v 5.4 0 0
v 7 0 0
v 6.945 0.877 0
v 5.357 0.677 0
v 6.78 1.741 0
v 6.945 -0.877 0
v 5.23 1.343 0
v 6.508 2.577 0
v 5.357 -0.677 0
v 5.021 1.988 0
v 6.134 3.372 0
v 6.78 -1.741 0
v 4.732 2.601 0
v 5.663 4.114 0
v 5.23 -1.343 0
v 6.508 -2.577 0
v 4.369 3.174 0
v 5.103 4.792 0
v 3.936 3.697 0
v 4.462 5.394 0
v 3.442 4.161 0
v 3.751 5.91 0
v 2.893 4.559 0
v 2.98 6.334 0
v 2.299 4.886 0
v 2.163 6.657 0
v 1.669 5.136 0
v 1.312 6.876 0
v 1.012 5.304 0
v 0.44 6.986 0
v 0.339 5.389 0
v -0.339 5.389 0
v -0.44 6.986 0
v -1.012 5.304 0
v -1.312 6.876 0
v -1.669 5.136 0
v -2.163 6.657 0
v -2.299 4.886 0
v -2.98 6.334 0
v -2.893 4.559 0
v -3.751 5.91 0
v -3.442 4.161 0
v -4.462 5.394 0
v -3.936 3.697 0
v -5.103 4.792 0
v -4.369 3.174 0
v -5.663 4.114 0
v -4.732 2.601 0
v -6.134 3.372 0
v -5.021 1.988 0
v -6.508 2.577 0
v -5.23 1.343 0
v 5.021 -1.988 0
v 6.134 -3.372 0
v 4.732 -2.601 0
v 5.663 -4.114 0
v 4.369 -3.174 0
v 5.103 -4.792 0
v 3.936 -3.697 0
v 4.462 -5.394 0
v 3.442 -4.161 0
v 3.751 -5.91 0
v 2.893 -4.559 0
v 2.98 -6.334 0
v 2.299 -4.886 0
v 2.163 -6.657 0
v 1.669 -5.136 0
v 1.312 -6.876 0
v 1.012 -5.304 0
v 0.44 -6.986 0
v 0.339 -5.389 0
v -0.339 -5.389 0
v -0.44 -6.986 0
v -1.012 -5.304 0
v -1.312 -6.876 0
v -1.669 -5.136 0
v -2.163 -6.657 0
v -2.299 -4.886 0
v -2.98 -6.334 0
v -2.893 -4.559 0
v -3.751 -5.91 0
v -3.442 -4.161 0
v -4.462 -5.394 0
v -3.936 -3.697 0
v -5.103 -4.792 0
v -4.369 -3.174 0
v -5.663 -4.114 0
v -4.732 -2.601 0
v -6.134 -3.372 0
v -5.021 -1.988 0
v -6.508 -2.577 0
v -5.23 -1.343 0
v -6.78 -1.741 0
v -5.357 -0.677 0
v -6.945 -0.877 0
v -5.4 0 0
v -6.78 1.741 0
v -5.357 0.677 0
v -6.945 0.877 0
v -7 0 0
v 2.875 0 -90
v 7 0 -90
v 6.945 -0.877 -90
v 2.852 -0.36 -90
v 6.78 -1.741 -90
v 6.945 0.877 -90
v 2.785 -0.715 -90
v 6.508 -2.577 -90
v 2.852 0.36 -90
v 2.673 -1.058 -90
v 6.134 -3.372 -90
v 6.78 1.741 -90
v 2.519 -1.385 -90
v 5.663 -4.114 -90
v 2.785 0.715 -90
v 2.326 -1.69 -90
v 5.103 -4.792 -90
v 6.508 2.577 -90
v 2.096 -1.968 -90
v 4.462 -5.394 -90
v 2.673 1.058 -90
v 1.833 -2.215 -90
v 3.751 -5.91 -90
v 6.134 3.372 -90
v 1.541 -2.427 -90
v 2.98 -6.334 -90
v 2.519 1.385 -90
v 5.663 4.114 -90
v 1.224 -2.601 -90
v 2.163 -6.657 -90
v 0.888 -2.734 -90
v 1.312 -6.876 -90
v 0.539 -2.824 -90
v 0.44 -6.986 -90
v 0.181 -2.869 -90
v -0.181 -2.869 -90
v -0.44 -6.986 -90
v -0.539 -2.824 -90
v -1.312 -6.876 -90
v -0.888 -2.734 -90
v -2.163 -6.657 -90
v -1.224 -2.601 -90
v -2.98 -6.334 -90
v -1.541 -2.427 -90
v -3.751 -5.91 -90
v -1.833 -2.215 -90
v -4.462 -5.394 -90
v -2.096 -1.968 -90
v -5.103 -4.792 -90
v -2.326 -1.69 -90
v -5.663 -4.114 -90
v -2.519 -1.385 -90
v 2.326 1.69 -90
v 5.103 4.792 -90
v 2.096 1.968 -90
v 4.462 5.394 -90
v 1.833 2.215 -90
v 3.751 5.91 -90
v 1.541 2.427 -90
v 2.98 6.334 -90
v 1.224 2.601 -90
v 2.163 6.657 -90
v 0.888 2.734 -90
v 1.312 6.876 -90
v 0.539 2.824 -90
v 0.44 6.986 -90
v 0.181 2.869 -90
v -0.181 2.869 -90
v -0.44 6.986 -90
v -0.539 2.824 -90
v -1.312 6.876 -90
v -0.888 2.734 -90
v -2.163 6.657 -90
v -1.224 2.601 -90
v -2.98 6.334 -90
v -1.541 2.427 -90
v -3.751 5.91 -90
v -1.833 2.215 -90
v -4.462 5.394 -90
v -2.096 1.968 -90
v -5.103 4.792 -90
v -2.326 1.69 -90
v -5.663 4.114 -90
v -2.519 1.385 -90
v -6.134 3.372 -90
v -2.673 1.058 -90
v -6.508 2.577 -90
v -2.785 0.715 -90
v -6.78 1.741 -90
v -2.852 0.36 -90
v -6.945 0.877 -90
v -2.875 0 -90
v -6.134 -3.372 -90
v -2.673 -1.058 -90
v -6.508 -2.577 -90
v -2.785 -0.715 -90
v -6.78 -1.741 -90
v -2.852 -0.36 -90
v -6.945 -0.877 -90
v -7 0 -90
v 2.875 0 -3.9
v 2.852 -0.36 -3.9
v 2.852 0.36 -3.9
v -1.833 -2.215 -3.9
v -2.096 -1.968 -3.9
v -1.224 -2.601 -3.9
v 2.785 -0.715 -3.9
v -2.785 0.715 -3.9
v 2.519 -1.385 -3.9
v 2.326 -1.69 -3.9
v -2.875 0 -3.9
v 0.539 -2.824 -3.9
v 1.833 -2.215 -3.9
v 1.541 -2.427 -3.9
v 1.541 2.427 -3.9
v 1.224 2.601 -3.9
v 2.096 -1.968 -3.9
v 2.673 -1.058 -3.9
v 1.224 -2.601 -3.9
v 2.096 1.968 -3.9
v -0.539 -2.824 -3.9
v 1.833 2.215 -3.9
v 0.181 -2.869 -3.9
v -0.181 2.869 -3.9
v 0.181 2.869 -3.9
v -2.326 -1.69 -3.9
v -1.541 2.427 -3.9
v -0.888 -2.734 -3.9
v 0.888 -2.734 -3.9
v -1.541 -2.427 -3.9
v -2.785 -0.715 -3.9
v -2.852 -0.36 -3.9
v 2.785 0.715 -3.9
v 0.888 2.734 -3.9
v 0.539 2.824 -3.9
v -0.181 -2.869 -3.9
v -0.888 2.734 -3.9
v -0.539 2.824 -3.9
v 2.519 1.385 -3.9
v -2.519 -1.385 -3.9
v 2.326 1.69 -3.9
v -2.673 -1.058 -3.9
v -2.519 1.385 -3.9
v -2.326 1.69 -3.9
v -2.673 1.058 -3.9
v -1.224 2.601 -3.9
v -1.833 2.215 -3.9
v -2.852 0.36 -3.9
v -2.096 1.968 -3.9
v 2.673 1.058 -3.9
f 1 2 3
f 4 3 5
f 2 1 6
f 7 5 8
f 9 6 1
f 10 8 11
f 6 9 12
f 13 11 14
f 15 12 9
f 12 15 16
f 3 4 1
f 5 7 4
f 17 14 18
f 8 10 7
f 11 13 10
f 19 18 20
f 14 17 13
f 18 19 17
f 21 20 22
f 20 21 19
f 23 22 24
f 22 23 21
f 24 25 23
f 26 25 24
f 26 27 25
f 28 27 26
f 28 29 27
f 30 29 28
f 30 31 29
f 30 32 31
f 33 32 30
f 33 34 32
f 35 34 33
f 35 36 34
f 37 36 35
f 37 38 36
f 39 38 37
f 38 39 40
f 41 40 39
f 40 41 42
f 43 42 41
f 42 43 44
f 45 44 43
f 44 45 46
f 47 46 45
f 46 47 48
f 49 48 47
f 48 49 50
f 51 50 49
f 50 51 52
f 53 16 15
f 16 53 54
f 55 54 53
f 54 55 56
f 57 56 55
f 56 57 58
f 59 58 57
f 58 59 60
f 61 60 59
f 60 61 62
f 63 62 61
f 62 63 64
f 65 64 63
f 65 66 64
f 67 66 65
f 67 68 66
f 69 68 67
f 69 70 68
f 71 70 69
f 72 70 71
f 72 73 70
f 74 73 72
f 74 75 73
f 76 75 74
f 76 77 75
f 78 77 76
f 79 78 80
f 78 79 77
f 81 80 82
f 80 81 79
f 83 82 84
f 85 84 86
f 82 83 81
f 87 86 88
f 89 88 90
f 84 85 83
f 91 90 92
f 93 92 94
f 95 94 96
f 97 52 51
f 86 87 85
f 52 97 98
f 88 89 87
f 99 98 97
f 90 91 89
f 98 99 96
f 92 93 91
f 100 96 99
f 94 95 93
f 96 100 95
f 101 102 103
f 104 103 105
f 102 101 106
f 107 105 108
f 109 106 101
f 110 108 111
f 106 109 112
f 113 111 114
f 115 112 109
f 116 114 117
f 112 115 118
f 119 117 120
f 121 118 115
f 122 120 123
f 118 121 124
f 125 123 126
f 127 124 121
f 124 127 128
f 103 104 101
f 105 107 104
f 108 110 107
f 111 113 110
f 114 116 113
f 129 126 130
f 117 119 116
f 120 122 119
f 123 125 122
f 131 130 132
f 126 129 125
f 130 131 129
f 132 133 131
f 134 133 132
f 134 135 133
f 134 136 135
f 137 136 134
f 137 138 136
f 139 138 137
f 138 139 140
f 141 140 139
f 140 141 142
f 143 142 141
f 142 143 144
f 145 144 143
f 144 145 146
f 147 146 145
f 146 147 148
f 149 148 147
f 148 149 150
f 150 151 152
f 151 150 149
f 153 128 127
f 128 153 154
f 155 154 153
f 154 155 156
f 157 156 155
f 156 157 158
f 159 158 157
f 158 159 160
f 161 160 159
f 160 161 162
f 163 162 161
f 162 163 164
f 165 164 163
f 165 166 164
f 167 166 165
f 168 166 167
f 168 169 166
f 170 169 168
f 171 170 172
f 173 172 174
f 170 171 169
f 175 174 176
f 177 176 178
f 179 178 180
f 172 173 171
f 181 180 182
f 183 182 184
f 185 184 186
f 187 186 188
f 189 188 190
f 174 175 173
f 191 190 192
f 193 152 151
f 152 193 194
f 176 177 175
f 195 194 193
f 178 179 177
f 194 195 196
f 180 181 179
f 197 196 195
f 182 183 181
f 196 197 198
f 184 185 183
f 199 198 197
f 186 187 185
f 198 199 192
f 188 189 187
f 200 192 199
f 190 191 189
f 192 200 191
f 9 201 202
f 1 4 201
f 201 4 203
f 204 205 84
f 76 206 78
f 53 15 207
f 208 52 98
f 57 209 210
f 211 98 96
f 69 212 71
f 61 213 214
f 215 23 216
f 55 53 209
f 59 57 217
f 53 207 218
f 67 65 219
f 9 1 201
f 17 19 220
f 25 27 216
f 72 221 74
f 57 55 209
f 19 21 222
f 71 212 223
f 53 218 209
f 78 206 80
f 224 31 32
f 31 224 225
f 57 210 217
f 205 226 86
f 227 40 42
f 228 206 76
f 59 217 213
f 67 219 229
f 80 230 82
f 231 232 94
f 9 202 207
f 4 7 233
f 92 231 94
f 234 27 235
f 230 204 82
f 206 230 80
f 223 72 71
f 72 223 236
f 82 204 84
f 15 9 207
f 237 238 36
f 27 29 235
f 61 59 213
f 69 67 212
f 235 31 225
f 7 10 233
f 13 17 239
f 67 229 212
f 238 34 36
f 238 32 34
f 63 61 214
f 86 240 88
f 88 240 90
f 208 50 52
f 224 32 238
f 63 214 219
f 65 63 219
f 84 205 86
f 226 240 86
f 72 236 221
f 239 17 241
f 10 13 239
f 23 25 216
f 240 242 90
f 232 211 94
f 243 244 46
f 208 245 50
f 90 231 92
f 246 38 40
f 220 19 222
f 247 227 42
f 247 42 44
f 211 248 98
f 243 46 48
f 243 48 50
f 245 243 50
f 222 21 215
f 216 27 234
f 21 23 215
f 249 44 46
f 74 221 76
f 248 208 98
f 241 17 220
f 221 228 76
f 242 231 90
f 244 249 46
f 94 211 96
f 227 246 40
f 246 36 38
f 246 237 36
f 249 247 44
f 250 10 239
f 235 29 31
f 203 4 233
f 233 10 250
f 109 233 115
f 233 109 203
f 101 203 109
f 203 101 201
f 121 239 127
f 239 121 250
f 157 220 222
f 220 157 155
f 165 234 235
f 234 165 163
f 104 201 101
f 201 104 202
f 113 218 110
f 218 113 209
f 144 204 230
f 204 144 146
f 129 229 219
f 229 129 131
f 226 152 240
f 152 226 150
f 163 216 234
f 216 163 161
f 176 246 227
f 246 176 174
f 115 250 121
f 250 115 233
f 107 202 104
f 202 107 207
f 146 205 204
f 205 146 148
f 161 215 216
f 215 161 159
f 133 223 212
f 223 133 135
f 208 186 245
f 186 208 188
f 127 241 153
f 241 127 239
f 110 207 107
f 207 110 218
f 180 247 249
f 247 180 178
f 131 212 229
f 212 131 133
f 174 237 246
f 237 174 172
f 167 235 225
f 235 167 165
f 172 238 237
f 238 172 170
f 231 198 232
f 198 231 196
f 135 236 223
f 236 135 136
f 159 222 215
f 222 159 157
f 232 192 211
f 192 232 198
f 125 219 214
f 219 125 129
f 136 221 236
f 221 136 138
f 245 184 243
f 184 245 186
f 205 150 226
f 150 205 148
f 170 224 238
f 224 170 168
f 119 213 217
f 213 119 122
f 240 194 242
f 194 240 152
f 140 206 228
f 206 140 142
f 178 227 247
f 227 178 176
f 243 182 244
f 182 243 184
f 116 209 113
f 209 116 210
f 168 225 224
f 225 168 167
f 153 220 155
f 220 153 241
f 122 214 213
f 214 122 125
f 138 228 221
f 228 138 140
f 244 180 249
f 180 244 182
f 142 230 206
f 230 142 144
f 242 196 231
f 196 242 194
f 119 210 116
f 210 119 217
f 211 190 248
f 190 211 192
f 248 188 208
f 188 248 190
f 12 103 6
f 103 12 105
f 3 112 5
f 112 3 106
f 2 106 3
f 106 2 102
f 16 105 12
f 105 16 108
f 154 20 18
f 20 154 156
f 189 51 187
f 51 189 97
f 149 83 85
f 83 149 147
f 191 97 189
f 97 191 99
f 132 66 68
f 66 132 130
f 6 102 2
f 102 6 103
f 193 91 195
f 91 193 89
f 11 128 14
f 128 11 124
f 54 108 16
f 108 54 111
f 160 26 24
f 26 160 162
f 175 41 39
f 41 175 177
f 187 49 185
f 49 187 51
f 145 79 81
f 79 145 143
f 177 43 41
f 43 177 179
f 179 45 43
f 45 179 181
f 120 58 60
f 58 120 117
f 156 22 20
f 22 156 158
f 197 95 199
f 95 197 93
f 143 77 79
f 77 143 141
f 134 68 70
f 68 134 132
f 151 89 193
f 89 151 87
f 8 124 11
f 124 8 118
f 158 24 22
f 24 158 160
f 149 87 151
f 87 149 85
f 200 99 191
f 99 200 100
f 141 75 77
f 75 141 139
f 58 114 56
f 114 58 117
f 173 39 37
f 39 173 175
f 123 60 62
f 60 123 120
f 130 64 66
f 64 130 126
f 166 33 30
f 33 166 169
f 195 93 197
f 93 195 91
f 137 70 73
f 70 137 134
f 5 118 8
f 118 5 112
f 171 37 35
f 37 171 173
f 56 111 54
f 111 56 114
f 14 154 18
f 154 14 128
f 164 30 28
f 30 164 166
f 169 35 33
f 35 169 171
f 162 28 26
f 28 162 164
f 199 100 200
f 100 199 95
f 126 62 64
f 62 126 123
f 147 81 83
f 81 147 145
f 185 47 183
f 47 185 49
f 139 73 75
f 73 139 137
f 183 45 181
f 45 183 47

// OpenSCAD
$fn = 50;


difference() {
	union() {
		translate(v = [0, 0, -90.0000000000]) {
			cylinder(h = 90, r = 7.0000000000);
		}
		cylinder(h = 0, r = 10.0000000000);
	}
	union() {
		translate(v = [0, 0, 0]) {
			rotate(a = [0, 0, 0]) {
				difference() {
					union() {
						#translate(v = [0, 0, -90.0000000000]) {
							cylinder(h = 90, r = 2.6000000000);
						}
						#translate(v = [0, 0, -3.9000000000]) {
							cylinder(h = 3.9000000000, r1 = 2.8750000000, r2 = 5.4000000000);
						}
						#translate(v = [0, 0, -90.0000000000]) {
							cylinder(h = 90, r = 2.8750000000);
						}
						#translate(v = [0, 0, -90.0000000000]) {
							cylinder(h = 90, r = 2.6000000000);
						}
					}
					union();
				}
			}
		}
	}
}
